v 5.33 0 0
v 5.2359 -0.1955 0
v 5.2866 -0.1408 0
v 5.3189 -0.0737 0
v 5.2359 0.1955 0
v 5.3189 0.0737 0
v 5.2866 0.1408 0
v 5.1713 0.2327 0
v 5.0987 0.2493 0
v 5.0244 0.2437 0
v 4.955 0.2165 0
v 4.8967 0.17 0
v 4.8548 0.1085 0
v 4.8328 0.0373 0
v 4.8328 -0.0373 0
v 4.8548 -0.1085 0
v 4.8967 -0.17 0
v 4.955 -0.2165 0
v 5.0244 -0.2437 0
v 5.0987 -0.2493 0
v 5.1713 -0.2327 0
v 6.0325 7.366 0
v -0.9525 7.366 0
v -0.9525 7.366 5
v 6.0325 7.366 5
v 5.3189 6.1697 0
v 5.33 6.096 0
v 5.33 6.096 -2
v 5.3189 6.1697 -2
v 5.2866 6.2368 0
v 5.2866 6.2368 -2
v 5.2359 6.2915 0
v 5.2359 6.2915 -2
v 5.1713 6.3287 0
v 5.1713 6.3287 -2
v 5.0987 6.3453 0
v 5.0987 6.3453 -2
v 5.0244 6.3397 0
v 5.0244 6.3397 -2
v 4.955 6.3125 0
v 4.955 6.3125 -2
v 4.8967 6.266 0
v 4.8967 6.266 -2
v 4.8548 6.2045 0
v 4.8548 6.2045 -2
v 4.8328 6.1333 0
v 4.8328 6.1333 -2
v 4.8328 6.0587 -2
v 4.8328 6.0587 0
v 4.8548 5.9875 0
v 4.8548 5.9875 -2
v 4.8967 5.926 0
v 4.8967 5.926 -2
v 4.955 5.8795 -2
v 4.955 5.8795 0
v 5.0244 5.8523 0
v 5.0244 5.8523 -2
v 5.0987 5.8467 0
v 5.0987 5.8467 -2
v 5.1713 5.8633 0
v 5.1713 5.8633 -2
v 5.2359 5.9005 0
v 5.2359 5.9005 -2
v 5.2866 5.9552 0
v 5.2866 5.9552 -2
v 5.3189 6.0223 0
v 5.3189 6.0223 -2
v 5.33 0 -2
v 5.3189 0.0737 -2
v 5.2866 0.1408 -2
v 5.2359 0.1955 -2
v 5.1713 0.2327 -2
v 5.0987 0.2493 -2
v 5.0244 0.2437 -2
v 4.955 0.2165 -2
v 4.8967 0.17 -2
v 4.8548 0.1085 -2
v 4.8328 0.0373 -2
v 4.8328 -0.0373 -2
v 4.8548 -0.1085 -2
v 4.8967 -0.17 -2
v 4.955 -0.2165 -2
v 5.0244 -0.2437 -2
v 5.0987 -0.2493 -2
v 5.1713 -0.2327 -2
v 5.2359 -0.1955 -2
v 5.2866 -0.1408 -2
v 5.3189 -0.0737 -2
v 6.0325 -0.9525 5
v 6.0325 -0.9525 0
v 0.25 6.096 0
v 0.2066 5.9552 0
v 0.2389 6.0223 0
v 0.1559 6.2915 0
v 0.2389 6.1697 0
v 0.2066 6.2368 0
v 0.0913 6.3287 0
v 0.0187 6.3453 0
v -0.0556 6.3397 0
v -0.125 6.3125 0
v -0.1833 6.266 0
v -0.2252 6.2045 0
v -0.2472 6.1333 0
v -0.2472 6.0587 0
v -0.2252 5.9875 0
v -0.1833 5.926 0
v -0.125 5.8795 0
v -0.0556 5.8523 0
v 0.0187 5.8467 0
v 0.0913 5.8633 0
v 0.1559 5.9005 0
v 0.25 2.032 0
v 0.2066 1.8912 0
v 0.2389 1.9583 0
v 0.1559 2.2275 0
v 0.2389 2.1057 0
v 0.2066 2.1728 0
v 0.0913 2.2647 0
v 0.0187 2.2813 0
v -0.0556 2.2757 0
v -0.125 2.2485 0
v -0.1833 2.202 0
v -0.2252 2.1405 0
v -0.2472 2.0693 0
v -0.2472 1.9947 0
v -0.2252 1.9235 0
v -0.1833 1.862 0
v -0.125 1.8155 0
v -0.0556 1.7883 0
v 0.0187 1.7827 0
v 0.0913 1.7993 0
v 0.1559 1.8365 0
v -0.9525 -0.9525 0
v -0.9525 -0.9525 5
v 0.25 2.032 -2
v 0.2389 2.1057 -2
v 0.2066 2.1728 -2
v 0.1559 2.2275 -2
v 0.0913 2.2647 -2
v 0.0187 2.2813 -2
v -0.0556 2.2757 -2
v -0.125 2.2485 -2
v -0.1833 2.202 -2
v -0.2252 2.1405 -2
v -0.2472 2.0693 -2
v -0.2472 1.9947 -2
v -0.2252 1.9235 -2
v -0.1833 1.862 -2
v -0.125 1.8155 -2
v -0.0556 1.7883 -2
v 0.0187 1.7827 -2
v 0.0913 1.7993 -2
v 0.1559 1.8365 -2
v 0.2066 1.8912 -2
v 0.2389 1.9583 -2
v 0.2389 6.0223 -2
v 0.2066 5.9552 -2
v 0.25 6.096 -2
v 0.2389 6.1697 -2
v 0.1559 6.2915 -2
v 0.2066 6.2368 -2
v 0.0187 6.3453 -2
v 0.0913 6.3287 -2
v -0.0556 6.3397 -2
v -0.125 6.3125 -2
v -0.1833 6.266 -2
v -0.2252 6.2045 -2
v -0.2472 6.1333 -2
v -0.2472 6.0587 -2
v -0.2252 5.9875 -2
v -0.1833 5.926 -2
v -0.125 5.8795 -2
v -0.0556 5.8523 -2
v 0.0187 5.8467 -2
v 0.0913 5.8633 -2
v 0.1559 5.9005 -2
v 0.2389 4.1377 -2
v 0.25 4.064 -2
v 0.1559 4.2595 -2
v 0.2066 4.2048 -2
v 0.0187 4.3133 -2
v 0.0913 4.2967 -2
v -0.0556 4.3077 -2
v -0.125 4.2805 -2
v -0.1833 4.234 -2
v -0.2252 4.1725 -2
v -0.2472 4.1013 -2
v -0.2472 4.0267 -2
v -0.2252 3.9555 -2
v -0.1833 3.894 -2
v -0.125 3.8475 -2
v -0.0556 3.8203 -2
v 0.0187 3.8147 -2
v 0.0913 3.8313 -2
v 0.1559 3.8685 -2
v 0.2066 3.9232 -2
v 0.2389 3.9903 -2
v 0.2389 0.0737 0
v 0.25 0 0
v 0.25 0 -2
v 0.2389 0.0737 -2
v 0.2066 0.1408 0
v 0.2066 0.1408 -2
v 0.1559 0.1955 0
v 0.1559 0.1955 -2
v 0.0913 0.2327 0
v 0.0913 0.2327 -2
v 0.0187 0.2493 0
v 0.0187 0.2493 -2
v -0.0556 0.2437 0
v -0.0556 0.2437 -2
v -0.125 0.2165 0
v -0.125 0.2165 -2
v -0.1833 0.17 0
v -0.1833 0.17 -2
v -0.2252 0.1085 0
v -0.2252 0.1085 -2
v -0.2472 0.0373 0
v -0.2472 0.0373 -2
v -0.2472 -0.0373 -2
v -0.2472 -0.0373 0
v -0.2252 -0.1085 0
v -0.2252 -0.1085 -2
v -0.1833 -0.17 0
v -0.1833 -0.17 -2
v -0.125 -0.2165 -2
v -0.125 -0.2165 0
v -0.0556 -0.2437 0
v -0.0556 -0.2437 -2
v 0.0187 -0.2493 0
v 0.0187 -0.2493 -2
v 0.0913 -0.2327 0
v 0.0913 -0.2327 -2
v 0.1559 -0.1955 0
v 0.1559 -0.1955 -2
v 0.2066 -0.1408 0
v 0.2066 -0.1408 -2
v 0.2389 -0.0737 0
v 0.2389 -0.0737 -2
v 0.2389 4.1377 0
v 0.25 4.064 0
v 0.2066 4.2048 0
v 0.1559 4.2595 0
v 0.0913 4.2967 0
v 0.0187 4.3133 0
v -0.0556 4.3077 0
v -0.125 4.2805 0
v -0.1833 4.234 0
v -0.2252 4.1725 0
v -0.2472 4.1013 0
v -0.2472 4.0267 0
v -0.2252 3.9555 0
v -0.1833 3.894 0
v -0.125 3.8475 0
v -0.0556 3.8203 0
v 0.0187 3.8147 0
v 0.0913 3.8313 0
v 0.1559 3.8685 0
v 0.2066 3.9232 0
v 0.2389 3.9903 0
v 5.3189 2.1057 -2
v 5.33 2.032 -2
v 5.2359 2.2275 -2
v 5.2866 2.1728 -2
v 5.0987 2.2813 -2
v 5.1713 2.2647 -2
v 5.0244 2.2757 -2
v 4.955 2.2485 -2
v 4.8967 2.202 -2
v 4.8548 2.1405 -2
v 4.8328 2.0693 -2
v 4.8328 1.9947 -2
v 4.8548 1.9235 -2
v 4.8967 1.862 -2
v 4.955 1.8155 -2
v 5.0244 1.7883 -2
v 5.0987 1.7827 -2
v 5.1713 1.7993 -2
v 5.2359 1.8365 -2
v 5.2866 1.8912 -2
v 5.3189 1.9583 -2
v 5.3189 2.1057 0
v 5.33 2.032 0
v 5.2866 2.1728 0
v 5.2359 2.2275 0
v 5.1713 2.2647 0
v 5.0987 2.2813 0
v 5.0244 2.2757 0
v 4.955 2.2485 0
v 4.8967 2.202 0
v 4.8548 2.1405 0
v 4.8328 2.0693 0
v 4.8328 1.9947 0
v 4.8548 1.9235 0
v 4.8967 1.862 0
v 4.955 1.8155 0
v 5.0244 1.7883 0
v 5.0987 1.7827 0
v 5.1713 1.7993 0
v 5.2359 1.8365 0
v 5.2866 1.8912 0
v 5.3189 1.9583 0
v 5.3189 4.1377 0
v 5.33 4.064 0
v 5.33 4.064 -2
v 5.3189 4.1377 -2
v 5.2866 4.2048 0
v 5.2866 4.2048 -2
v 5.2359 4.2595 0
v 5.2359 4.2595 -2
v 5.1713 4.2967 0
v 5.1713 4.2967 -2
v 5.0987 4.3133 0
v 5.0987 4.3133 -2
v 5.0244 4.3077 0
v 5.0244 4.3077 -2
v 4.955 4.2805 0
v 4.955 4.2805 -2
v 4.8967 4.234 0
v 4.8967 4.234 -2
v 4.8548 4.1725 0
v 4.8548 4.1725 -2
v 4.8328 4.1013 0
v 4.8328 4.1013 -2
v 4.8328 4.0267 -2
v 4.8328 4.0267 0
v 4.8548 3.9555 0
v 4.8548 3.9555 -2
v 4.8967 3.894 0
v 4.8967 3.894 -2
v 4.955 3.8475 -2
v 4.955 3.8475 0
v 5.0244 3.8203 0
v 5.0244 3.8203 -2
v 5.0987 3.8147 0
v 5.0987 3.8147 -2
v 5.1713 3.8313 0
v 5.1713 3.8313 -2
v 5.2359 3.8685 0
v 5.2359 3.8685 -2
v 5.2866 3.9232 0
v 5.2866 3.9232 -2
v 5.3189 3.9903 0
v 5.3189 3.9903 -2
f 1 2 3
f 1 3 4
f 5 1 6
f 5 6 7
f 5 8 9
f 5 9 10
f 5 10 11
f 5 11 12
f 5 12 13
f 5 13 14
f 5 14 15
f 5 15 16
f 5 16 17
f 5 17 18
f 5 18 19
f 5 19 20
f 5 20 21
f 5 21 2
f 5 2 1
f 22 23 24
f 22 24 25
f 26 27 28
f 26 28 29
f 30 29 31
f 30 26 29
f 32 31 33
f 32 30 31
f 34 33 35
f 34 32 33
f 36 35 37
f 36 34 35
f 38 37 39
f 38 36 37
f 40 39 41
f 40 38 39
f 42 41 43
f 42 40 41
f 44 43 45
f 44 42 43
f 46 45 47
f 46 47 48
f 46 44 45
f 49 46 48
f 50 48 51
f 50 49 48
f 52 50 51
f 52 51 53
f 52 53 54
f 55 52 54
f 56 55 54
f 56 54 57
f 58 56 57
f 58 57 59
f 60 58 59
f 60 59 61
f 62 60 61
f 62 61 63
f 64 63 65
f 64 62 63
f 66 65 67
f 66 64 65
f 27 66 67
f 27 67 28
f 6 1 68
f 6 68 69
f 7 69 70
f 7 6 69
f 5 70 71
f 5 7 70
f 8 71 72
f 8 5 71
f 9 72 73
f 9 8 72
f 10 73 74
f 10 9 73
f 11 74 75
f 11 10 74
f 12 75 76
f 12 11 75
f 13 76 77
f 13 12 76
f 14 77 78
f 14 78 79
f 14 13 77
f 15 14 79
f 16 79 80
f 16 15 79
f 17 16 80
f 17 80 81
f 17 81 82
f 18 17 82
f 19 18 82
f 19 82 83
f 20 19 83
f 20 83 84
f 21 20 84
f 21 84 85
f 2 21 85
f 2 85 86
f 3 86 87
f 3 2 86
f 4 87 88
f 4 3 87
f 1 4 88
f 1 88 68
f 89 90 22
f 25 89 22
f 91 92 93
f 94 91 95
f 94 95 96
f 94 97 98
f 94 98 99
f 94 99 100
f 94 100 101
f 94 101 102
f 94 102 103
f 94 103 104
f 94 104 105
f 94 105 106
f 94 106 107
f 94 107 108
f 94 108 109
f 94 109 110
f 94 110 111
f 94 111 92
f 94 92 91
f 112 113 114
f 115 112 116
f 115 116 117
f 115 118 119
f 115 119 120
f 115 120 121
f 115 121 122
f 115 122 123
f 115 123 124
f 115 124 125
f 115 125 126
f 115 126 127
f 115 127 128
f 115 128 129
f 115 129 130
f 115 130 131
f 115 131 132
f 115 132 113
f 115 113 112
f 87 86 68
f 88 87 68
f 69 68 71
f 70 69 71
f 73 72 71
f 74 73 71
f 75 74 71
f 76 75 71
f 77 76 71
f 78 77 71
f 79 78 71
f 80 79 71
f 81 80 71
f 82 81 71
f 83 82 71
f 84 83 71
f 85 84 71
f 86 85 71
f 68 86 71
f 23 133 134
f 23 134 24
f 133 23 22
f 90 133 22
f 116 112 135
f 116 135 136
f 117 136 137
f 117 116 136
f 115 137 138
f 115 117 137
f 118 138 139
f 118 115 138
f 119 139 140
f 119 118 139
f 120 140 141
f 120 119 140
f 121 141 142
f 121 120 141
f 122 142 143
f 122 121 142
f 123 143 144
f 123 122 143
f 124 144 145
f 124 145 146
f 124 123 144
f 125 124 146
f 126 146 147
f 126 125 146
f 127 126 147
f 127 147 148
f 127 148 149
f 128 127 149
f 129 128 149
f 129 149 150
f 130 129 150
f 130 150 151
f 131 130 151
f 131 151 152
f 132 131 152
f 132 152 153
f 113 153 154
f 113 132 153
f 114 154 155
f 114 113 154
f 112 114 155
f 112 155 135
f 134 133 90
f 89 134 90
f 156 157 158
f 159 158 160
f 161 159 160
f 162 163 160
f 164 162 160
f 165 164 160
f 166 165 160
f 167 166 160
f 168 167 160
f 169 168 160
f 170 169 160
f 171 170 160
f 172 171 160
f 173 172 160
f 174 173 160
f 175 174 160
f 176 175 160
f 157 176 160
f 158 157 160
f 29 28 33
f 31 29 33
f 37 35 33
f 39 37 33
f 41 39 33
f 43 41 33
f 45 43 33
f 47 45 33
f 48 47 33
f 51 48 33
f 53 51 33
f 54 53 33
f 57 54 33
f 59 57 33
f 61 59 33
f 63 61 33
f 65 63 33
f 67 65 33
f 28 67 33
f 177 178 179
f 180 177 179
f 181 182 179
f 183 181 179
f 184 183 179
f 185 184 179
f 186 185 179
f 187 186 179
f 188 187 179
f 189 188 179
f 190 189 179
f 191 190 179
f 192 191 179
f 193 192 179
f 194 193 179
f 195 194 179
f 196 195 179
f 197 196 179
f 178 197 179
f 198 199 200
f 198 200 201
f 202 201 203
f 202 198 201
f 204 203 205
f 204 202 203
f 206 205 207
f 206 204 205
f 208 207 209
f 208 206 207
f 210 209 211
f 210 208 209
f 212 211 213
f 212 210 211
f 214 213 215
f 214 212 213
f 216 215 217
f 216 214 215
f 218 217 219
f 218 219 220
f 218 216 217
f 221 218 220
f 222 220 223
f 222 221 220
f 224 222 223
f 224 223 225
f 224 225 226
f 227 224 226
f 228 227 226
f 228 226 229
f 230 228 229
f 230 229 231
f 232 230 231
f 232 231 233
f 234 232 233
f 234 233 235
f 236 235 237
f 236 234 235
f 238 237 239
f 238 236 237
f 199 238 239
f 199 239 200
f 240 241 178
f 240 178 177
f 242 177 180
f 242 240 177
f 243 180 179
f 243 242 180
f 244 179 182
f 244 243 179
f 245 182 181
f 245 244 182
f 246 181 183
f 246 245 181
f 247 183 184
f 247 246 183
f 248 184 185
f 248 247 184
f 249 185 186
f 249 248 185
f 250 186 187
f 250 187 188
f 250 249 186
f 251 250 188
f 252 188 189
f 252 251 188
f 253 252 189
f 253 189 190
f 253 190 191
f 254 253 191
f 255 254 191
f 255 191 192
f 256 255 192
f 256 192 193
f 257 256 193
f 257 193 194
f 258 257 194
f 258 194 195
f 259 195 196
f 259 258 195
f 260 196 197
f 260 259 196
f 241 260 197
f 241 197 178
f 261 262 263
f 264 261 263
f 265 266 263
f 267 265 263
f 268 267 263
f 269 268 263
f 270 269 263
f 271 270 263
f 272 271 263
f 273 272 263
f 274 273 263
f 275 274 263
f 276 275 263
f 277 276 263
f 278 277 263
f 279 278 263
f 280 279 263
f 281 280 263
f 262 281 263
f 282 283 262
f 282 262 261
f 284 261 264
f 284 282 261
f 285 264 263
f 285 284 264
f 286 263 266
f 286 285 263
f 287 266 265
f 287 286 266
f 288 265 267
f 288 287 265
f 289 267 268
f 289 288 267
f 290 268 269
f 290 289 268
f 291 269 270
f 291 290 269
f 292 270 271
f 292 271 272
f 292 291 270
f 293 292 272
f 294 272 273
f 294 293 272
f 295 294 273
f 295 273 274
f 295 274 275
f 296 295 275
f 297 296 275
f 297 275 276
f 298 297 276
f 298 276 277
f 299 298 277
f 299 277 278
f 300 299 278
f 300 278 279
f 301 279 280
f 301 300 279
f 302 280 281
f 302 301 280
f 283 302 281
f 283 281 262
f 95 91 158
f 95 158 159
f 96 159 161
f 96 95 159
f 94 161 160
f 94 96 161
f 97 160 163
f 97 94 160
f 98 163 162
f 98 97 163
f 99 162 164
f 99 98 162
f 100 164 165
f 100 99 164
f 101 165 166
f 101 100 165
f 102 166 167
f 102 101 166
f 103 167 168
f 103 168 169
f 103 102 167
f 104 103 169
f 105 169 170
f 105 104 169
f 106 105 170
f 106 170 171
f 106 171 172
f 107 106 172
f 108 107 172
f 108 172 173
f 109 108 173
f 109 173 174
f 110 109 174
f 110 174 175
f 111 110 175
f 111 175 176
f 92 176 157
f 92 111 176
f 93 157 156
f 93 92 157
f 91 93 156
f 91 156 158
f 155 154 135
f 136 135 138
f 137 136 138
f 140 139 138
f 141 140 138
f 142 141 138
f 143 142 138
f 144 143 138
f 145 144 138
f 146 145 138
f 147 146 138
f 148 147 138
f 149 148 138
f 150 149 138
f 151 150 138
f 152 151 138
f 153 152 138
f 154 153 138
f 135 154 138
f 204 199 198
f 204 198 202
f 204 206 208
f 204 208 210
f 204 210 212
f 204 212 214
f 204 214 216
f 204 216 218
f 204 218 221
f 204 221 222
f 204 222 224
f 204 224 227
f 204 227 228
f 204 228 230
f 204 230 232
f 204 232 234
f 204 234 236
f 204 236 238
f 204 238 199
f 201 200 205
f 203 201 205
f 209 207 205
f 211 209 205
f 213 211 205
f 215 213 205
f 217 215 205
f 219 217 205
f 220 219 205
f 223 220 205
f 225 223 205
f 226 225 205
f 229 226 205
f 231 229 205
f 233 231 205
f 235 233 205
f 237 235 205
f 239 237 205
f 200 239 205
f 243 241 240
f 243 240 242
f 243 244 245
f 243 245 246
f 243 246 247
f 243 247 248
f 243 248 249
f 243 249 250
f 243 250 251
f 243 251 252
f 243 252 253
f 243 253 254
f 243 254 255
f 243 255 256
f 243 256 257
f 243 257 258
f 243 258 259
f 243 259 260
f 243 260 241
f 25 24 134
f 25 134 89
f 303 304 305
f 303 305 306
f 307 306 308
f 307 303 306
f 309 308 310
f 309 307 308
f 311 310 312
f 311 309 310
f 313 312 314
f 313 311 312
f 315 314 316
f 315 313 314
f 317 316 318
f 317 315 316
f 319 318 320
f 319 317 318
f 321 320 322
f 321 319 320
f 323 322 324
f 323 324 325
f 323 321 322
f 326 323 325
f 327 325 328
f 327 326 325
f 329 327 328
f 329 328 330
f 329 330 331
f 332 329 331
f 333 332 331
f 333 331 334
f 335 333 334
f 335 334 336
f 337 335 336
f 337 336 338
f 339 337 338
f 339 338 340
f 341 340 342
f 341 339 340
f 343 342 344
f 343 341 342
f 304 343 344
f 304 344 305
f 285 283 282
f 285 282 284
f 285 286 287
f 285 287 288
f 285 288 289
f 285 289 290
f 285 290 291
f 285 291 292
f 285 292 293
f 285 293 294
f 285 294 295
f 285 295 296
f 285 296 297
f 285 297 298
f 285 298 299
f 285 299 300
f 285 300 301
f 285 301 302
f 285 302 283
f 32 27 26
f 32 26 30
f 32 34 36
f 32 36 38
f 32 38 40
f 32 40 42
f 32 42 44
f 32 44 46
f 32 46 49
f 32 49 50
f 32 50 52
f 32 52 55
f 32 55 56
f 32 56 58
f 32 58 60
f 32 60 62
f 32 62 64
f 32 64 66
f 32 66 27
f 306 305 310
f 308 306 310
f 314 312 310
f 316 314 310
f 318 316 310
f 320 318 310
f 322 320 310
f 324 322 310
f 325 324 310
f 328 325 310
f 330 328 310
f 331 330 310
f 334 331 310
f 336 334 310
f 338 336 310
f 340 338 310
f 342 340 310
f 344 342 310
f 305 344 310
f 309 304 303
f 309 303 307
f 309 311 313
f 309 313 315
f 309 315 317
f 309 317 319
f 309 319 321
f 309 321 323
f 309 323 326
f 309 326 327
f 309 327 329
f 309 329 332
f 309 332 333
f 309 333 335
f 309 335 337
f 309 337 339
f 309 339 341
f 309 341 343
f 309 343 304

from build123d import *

# Parameters (mm, degrees)
SKETCH1_W               = 6.985
SKETCH1_H               = 8.3185
COMPONENT_OUTLINE_DEPTH = 5
SKETCH2_R               = 0.25
EXTRUDE_1_DEPTH         = 2
SKETCH3_R               = 0.25
BOSS_EXTRUDE3_DEPTH     = 2
SKETCH4_R               = 0.25
BOSS_EXTRUDE4_DEPTH     = 2
SKETCH5_R               = 0.25
BOSS_EXTRUDE5_DEPTH     = 2
SKETCH6_R               = 0.25
EXTRUDE_2_DEPTH         = 2
SKETCH7_R               = 0.25
EXTRUDE_3_DEPTH         = 2
SKETCH8_R               = 0.25
EXTRUDE_4_DEPTH         = 2
SKETCH9_R               = 0.25
EXTRUDE_5_DEPTH         = 2


with BuildPart() as part:
    # Sketch1 → Component_Outline (new body)
    with BuildSketch(Plane.XY):
        with Locations((2.54, 3.20675)):
            Rectangle(SKETCH1_W, SKETCH1_H)
    extrude(amount=COMPONENT_OUTLINE_DEPTH)


with BuildPart() as body_2:
    # Sketch2 → Extrude 1 (new body)
    with BuildSketch(Plane.XY):
        with Locations((5.08, 0)):
            Circle(SKETCH2_R)
    extrude(amount=-EXTRUDE_1_DEPTH)


with BuildPart() as body_3:
    # Sketch3 → Boss-Extrude3 (new body)
    with BuildSketch(Plane.XY):
        with Locations((5.08, 2.032)):
            Circle(SKETCH3_R)
    extrude(amount=-BOSS_EXTRUDE3_DEPTH)


with BuildPart() as body_4:
    # Sketch4 → Boss-Extrude4 (new body)
    with BuildSketch(Plane.XY):
        with Locations((5.08, 4.064)):
            Circle(SKETCH4_R)
    extrude(amount=-BOSS_EXTRUDE4_DEPTH)


with BuildPart() as body_5:
    # Sketch5 → Boss-Extrude5 (new body)
    with BuildSketch(Plane.XY):
        with Locations((5.08, 6.096)):
            Circle(SKETCH5_R)
    extrude(amount=-BOSS_EXTRUDE5_DEPTH)


with BuildPart() as body_6:
    # Sketch6 → Extrude 2 (new body)
    with BuildSketch(Plane.XY):
        Circle(SKETCH6_R)
    extrude(amount=-EXTRUDE_2_DEPTH)


with BuildPart() as body_7:
    # Sketch7 → Extrude 3 (new body)
    with BuildSketch(Plane.XY):
        with Locations((0, 2.032)):
            Circle(SKETCH7_R)
    extrude(amount=-EXTRUDE_3_DEPTH)


with BuildPart() as body_8:
    # Sketch8 → Extrude 4 (new body)
    with BuildSketch(Plane.XY):
        with Locations((0, 4.064)):
            Circle(SKETCH8_R)
    extrude(amount=-EXTRUDE_4_DEPTH)


with BuildPart() as body_9:
    # Sketch9 → Extrude 5 (new body)
    with BuildSketch(Plane.XY):
        with Locations((0, 6.096)):
            Circle(SKETCH9_R)
    extrude(amount=-EXTRUDE_5_DEPTH)


solid = Compound([part.part, body_2.part, body_3.part, body_4.part, body_5.part, body_6.part, body_7.part, body_8.part, body_9.part])
